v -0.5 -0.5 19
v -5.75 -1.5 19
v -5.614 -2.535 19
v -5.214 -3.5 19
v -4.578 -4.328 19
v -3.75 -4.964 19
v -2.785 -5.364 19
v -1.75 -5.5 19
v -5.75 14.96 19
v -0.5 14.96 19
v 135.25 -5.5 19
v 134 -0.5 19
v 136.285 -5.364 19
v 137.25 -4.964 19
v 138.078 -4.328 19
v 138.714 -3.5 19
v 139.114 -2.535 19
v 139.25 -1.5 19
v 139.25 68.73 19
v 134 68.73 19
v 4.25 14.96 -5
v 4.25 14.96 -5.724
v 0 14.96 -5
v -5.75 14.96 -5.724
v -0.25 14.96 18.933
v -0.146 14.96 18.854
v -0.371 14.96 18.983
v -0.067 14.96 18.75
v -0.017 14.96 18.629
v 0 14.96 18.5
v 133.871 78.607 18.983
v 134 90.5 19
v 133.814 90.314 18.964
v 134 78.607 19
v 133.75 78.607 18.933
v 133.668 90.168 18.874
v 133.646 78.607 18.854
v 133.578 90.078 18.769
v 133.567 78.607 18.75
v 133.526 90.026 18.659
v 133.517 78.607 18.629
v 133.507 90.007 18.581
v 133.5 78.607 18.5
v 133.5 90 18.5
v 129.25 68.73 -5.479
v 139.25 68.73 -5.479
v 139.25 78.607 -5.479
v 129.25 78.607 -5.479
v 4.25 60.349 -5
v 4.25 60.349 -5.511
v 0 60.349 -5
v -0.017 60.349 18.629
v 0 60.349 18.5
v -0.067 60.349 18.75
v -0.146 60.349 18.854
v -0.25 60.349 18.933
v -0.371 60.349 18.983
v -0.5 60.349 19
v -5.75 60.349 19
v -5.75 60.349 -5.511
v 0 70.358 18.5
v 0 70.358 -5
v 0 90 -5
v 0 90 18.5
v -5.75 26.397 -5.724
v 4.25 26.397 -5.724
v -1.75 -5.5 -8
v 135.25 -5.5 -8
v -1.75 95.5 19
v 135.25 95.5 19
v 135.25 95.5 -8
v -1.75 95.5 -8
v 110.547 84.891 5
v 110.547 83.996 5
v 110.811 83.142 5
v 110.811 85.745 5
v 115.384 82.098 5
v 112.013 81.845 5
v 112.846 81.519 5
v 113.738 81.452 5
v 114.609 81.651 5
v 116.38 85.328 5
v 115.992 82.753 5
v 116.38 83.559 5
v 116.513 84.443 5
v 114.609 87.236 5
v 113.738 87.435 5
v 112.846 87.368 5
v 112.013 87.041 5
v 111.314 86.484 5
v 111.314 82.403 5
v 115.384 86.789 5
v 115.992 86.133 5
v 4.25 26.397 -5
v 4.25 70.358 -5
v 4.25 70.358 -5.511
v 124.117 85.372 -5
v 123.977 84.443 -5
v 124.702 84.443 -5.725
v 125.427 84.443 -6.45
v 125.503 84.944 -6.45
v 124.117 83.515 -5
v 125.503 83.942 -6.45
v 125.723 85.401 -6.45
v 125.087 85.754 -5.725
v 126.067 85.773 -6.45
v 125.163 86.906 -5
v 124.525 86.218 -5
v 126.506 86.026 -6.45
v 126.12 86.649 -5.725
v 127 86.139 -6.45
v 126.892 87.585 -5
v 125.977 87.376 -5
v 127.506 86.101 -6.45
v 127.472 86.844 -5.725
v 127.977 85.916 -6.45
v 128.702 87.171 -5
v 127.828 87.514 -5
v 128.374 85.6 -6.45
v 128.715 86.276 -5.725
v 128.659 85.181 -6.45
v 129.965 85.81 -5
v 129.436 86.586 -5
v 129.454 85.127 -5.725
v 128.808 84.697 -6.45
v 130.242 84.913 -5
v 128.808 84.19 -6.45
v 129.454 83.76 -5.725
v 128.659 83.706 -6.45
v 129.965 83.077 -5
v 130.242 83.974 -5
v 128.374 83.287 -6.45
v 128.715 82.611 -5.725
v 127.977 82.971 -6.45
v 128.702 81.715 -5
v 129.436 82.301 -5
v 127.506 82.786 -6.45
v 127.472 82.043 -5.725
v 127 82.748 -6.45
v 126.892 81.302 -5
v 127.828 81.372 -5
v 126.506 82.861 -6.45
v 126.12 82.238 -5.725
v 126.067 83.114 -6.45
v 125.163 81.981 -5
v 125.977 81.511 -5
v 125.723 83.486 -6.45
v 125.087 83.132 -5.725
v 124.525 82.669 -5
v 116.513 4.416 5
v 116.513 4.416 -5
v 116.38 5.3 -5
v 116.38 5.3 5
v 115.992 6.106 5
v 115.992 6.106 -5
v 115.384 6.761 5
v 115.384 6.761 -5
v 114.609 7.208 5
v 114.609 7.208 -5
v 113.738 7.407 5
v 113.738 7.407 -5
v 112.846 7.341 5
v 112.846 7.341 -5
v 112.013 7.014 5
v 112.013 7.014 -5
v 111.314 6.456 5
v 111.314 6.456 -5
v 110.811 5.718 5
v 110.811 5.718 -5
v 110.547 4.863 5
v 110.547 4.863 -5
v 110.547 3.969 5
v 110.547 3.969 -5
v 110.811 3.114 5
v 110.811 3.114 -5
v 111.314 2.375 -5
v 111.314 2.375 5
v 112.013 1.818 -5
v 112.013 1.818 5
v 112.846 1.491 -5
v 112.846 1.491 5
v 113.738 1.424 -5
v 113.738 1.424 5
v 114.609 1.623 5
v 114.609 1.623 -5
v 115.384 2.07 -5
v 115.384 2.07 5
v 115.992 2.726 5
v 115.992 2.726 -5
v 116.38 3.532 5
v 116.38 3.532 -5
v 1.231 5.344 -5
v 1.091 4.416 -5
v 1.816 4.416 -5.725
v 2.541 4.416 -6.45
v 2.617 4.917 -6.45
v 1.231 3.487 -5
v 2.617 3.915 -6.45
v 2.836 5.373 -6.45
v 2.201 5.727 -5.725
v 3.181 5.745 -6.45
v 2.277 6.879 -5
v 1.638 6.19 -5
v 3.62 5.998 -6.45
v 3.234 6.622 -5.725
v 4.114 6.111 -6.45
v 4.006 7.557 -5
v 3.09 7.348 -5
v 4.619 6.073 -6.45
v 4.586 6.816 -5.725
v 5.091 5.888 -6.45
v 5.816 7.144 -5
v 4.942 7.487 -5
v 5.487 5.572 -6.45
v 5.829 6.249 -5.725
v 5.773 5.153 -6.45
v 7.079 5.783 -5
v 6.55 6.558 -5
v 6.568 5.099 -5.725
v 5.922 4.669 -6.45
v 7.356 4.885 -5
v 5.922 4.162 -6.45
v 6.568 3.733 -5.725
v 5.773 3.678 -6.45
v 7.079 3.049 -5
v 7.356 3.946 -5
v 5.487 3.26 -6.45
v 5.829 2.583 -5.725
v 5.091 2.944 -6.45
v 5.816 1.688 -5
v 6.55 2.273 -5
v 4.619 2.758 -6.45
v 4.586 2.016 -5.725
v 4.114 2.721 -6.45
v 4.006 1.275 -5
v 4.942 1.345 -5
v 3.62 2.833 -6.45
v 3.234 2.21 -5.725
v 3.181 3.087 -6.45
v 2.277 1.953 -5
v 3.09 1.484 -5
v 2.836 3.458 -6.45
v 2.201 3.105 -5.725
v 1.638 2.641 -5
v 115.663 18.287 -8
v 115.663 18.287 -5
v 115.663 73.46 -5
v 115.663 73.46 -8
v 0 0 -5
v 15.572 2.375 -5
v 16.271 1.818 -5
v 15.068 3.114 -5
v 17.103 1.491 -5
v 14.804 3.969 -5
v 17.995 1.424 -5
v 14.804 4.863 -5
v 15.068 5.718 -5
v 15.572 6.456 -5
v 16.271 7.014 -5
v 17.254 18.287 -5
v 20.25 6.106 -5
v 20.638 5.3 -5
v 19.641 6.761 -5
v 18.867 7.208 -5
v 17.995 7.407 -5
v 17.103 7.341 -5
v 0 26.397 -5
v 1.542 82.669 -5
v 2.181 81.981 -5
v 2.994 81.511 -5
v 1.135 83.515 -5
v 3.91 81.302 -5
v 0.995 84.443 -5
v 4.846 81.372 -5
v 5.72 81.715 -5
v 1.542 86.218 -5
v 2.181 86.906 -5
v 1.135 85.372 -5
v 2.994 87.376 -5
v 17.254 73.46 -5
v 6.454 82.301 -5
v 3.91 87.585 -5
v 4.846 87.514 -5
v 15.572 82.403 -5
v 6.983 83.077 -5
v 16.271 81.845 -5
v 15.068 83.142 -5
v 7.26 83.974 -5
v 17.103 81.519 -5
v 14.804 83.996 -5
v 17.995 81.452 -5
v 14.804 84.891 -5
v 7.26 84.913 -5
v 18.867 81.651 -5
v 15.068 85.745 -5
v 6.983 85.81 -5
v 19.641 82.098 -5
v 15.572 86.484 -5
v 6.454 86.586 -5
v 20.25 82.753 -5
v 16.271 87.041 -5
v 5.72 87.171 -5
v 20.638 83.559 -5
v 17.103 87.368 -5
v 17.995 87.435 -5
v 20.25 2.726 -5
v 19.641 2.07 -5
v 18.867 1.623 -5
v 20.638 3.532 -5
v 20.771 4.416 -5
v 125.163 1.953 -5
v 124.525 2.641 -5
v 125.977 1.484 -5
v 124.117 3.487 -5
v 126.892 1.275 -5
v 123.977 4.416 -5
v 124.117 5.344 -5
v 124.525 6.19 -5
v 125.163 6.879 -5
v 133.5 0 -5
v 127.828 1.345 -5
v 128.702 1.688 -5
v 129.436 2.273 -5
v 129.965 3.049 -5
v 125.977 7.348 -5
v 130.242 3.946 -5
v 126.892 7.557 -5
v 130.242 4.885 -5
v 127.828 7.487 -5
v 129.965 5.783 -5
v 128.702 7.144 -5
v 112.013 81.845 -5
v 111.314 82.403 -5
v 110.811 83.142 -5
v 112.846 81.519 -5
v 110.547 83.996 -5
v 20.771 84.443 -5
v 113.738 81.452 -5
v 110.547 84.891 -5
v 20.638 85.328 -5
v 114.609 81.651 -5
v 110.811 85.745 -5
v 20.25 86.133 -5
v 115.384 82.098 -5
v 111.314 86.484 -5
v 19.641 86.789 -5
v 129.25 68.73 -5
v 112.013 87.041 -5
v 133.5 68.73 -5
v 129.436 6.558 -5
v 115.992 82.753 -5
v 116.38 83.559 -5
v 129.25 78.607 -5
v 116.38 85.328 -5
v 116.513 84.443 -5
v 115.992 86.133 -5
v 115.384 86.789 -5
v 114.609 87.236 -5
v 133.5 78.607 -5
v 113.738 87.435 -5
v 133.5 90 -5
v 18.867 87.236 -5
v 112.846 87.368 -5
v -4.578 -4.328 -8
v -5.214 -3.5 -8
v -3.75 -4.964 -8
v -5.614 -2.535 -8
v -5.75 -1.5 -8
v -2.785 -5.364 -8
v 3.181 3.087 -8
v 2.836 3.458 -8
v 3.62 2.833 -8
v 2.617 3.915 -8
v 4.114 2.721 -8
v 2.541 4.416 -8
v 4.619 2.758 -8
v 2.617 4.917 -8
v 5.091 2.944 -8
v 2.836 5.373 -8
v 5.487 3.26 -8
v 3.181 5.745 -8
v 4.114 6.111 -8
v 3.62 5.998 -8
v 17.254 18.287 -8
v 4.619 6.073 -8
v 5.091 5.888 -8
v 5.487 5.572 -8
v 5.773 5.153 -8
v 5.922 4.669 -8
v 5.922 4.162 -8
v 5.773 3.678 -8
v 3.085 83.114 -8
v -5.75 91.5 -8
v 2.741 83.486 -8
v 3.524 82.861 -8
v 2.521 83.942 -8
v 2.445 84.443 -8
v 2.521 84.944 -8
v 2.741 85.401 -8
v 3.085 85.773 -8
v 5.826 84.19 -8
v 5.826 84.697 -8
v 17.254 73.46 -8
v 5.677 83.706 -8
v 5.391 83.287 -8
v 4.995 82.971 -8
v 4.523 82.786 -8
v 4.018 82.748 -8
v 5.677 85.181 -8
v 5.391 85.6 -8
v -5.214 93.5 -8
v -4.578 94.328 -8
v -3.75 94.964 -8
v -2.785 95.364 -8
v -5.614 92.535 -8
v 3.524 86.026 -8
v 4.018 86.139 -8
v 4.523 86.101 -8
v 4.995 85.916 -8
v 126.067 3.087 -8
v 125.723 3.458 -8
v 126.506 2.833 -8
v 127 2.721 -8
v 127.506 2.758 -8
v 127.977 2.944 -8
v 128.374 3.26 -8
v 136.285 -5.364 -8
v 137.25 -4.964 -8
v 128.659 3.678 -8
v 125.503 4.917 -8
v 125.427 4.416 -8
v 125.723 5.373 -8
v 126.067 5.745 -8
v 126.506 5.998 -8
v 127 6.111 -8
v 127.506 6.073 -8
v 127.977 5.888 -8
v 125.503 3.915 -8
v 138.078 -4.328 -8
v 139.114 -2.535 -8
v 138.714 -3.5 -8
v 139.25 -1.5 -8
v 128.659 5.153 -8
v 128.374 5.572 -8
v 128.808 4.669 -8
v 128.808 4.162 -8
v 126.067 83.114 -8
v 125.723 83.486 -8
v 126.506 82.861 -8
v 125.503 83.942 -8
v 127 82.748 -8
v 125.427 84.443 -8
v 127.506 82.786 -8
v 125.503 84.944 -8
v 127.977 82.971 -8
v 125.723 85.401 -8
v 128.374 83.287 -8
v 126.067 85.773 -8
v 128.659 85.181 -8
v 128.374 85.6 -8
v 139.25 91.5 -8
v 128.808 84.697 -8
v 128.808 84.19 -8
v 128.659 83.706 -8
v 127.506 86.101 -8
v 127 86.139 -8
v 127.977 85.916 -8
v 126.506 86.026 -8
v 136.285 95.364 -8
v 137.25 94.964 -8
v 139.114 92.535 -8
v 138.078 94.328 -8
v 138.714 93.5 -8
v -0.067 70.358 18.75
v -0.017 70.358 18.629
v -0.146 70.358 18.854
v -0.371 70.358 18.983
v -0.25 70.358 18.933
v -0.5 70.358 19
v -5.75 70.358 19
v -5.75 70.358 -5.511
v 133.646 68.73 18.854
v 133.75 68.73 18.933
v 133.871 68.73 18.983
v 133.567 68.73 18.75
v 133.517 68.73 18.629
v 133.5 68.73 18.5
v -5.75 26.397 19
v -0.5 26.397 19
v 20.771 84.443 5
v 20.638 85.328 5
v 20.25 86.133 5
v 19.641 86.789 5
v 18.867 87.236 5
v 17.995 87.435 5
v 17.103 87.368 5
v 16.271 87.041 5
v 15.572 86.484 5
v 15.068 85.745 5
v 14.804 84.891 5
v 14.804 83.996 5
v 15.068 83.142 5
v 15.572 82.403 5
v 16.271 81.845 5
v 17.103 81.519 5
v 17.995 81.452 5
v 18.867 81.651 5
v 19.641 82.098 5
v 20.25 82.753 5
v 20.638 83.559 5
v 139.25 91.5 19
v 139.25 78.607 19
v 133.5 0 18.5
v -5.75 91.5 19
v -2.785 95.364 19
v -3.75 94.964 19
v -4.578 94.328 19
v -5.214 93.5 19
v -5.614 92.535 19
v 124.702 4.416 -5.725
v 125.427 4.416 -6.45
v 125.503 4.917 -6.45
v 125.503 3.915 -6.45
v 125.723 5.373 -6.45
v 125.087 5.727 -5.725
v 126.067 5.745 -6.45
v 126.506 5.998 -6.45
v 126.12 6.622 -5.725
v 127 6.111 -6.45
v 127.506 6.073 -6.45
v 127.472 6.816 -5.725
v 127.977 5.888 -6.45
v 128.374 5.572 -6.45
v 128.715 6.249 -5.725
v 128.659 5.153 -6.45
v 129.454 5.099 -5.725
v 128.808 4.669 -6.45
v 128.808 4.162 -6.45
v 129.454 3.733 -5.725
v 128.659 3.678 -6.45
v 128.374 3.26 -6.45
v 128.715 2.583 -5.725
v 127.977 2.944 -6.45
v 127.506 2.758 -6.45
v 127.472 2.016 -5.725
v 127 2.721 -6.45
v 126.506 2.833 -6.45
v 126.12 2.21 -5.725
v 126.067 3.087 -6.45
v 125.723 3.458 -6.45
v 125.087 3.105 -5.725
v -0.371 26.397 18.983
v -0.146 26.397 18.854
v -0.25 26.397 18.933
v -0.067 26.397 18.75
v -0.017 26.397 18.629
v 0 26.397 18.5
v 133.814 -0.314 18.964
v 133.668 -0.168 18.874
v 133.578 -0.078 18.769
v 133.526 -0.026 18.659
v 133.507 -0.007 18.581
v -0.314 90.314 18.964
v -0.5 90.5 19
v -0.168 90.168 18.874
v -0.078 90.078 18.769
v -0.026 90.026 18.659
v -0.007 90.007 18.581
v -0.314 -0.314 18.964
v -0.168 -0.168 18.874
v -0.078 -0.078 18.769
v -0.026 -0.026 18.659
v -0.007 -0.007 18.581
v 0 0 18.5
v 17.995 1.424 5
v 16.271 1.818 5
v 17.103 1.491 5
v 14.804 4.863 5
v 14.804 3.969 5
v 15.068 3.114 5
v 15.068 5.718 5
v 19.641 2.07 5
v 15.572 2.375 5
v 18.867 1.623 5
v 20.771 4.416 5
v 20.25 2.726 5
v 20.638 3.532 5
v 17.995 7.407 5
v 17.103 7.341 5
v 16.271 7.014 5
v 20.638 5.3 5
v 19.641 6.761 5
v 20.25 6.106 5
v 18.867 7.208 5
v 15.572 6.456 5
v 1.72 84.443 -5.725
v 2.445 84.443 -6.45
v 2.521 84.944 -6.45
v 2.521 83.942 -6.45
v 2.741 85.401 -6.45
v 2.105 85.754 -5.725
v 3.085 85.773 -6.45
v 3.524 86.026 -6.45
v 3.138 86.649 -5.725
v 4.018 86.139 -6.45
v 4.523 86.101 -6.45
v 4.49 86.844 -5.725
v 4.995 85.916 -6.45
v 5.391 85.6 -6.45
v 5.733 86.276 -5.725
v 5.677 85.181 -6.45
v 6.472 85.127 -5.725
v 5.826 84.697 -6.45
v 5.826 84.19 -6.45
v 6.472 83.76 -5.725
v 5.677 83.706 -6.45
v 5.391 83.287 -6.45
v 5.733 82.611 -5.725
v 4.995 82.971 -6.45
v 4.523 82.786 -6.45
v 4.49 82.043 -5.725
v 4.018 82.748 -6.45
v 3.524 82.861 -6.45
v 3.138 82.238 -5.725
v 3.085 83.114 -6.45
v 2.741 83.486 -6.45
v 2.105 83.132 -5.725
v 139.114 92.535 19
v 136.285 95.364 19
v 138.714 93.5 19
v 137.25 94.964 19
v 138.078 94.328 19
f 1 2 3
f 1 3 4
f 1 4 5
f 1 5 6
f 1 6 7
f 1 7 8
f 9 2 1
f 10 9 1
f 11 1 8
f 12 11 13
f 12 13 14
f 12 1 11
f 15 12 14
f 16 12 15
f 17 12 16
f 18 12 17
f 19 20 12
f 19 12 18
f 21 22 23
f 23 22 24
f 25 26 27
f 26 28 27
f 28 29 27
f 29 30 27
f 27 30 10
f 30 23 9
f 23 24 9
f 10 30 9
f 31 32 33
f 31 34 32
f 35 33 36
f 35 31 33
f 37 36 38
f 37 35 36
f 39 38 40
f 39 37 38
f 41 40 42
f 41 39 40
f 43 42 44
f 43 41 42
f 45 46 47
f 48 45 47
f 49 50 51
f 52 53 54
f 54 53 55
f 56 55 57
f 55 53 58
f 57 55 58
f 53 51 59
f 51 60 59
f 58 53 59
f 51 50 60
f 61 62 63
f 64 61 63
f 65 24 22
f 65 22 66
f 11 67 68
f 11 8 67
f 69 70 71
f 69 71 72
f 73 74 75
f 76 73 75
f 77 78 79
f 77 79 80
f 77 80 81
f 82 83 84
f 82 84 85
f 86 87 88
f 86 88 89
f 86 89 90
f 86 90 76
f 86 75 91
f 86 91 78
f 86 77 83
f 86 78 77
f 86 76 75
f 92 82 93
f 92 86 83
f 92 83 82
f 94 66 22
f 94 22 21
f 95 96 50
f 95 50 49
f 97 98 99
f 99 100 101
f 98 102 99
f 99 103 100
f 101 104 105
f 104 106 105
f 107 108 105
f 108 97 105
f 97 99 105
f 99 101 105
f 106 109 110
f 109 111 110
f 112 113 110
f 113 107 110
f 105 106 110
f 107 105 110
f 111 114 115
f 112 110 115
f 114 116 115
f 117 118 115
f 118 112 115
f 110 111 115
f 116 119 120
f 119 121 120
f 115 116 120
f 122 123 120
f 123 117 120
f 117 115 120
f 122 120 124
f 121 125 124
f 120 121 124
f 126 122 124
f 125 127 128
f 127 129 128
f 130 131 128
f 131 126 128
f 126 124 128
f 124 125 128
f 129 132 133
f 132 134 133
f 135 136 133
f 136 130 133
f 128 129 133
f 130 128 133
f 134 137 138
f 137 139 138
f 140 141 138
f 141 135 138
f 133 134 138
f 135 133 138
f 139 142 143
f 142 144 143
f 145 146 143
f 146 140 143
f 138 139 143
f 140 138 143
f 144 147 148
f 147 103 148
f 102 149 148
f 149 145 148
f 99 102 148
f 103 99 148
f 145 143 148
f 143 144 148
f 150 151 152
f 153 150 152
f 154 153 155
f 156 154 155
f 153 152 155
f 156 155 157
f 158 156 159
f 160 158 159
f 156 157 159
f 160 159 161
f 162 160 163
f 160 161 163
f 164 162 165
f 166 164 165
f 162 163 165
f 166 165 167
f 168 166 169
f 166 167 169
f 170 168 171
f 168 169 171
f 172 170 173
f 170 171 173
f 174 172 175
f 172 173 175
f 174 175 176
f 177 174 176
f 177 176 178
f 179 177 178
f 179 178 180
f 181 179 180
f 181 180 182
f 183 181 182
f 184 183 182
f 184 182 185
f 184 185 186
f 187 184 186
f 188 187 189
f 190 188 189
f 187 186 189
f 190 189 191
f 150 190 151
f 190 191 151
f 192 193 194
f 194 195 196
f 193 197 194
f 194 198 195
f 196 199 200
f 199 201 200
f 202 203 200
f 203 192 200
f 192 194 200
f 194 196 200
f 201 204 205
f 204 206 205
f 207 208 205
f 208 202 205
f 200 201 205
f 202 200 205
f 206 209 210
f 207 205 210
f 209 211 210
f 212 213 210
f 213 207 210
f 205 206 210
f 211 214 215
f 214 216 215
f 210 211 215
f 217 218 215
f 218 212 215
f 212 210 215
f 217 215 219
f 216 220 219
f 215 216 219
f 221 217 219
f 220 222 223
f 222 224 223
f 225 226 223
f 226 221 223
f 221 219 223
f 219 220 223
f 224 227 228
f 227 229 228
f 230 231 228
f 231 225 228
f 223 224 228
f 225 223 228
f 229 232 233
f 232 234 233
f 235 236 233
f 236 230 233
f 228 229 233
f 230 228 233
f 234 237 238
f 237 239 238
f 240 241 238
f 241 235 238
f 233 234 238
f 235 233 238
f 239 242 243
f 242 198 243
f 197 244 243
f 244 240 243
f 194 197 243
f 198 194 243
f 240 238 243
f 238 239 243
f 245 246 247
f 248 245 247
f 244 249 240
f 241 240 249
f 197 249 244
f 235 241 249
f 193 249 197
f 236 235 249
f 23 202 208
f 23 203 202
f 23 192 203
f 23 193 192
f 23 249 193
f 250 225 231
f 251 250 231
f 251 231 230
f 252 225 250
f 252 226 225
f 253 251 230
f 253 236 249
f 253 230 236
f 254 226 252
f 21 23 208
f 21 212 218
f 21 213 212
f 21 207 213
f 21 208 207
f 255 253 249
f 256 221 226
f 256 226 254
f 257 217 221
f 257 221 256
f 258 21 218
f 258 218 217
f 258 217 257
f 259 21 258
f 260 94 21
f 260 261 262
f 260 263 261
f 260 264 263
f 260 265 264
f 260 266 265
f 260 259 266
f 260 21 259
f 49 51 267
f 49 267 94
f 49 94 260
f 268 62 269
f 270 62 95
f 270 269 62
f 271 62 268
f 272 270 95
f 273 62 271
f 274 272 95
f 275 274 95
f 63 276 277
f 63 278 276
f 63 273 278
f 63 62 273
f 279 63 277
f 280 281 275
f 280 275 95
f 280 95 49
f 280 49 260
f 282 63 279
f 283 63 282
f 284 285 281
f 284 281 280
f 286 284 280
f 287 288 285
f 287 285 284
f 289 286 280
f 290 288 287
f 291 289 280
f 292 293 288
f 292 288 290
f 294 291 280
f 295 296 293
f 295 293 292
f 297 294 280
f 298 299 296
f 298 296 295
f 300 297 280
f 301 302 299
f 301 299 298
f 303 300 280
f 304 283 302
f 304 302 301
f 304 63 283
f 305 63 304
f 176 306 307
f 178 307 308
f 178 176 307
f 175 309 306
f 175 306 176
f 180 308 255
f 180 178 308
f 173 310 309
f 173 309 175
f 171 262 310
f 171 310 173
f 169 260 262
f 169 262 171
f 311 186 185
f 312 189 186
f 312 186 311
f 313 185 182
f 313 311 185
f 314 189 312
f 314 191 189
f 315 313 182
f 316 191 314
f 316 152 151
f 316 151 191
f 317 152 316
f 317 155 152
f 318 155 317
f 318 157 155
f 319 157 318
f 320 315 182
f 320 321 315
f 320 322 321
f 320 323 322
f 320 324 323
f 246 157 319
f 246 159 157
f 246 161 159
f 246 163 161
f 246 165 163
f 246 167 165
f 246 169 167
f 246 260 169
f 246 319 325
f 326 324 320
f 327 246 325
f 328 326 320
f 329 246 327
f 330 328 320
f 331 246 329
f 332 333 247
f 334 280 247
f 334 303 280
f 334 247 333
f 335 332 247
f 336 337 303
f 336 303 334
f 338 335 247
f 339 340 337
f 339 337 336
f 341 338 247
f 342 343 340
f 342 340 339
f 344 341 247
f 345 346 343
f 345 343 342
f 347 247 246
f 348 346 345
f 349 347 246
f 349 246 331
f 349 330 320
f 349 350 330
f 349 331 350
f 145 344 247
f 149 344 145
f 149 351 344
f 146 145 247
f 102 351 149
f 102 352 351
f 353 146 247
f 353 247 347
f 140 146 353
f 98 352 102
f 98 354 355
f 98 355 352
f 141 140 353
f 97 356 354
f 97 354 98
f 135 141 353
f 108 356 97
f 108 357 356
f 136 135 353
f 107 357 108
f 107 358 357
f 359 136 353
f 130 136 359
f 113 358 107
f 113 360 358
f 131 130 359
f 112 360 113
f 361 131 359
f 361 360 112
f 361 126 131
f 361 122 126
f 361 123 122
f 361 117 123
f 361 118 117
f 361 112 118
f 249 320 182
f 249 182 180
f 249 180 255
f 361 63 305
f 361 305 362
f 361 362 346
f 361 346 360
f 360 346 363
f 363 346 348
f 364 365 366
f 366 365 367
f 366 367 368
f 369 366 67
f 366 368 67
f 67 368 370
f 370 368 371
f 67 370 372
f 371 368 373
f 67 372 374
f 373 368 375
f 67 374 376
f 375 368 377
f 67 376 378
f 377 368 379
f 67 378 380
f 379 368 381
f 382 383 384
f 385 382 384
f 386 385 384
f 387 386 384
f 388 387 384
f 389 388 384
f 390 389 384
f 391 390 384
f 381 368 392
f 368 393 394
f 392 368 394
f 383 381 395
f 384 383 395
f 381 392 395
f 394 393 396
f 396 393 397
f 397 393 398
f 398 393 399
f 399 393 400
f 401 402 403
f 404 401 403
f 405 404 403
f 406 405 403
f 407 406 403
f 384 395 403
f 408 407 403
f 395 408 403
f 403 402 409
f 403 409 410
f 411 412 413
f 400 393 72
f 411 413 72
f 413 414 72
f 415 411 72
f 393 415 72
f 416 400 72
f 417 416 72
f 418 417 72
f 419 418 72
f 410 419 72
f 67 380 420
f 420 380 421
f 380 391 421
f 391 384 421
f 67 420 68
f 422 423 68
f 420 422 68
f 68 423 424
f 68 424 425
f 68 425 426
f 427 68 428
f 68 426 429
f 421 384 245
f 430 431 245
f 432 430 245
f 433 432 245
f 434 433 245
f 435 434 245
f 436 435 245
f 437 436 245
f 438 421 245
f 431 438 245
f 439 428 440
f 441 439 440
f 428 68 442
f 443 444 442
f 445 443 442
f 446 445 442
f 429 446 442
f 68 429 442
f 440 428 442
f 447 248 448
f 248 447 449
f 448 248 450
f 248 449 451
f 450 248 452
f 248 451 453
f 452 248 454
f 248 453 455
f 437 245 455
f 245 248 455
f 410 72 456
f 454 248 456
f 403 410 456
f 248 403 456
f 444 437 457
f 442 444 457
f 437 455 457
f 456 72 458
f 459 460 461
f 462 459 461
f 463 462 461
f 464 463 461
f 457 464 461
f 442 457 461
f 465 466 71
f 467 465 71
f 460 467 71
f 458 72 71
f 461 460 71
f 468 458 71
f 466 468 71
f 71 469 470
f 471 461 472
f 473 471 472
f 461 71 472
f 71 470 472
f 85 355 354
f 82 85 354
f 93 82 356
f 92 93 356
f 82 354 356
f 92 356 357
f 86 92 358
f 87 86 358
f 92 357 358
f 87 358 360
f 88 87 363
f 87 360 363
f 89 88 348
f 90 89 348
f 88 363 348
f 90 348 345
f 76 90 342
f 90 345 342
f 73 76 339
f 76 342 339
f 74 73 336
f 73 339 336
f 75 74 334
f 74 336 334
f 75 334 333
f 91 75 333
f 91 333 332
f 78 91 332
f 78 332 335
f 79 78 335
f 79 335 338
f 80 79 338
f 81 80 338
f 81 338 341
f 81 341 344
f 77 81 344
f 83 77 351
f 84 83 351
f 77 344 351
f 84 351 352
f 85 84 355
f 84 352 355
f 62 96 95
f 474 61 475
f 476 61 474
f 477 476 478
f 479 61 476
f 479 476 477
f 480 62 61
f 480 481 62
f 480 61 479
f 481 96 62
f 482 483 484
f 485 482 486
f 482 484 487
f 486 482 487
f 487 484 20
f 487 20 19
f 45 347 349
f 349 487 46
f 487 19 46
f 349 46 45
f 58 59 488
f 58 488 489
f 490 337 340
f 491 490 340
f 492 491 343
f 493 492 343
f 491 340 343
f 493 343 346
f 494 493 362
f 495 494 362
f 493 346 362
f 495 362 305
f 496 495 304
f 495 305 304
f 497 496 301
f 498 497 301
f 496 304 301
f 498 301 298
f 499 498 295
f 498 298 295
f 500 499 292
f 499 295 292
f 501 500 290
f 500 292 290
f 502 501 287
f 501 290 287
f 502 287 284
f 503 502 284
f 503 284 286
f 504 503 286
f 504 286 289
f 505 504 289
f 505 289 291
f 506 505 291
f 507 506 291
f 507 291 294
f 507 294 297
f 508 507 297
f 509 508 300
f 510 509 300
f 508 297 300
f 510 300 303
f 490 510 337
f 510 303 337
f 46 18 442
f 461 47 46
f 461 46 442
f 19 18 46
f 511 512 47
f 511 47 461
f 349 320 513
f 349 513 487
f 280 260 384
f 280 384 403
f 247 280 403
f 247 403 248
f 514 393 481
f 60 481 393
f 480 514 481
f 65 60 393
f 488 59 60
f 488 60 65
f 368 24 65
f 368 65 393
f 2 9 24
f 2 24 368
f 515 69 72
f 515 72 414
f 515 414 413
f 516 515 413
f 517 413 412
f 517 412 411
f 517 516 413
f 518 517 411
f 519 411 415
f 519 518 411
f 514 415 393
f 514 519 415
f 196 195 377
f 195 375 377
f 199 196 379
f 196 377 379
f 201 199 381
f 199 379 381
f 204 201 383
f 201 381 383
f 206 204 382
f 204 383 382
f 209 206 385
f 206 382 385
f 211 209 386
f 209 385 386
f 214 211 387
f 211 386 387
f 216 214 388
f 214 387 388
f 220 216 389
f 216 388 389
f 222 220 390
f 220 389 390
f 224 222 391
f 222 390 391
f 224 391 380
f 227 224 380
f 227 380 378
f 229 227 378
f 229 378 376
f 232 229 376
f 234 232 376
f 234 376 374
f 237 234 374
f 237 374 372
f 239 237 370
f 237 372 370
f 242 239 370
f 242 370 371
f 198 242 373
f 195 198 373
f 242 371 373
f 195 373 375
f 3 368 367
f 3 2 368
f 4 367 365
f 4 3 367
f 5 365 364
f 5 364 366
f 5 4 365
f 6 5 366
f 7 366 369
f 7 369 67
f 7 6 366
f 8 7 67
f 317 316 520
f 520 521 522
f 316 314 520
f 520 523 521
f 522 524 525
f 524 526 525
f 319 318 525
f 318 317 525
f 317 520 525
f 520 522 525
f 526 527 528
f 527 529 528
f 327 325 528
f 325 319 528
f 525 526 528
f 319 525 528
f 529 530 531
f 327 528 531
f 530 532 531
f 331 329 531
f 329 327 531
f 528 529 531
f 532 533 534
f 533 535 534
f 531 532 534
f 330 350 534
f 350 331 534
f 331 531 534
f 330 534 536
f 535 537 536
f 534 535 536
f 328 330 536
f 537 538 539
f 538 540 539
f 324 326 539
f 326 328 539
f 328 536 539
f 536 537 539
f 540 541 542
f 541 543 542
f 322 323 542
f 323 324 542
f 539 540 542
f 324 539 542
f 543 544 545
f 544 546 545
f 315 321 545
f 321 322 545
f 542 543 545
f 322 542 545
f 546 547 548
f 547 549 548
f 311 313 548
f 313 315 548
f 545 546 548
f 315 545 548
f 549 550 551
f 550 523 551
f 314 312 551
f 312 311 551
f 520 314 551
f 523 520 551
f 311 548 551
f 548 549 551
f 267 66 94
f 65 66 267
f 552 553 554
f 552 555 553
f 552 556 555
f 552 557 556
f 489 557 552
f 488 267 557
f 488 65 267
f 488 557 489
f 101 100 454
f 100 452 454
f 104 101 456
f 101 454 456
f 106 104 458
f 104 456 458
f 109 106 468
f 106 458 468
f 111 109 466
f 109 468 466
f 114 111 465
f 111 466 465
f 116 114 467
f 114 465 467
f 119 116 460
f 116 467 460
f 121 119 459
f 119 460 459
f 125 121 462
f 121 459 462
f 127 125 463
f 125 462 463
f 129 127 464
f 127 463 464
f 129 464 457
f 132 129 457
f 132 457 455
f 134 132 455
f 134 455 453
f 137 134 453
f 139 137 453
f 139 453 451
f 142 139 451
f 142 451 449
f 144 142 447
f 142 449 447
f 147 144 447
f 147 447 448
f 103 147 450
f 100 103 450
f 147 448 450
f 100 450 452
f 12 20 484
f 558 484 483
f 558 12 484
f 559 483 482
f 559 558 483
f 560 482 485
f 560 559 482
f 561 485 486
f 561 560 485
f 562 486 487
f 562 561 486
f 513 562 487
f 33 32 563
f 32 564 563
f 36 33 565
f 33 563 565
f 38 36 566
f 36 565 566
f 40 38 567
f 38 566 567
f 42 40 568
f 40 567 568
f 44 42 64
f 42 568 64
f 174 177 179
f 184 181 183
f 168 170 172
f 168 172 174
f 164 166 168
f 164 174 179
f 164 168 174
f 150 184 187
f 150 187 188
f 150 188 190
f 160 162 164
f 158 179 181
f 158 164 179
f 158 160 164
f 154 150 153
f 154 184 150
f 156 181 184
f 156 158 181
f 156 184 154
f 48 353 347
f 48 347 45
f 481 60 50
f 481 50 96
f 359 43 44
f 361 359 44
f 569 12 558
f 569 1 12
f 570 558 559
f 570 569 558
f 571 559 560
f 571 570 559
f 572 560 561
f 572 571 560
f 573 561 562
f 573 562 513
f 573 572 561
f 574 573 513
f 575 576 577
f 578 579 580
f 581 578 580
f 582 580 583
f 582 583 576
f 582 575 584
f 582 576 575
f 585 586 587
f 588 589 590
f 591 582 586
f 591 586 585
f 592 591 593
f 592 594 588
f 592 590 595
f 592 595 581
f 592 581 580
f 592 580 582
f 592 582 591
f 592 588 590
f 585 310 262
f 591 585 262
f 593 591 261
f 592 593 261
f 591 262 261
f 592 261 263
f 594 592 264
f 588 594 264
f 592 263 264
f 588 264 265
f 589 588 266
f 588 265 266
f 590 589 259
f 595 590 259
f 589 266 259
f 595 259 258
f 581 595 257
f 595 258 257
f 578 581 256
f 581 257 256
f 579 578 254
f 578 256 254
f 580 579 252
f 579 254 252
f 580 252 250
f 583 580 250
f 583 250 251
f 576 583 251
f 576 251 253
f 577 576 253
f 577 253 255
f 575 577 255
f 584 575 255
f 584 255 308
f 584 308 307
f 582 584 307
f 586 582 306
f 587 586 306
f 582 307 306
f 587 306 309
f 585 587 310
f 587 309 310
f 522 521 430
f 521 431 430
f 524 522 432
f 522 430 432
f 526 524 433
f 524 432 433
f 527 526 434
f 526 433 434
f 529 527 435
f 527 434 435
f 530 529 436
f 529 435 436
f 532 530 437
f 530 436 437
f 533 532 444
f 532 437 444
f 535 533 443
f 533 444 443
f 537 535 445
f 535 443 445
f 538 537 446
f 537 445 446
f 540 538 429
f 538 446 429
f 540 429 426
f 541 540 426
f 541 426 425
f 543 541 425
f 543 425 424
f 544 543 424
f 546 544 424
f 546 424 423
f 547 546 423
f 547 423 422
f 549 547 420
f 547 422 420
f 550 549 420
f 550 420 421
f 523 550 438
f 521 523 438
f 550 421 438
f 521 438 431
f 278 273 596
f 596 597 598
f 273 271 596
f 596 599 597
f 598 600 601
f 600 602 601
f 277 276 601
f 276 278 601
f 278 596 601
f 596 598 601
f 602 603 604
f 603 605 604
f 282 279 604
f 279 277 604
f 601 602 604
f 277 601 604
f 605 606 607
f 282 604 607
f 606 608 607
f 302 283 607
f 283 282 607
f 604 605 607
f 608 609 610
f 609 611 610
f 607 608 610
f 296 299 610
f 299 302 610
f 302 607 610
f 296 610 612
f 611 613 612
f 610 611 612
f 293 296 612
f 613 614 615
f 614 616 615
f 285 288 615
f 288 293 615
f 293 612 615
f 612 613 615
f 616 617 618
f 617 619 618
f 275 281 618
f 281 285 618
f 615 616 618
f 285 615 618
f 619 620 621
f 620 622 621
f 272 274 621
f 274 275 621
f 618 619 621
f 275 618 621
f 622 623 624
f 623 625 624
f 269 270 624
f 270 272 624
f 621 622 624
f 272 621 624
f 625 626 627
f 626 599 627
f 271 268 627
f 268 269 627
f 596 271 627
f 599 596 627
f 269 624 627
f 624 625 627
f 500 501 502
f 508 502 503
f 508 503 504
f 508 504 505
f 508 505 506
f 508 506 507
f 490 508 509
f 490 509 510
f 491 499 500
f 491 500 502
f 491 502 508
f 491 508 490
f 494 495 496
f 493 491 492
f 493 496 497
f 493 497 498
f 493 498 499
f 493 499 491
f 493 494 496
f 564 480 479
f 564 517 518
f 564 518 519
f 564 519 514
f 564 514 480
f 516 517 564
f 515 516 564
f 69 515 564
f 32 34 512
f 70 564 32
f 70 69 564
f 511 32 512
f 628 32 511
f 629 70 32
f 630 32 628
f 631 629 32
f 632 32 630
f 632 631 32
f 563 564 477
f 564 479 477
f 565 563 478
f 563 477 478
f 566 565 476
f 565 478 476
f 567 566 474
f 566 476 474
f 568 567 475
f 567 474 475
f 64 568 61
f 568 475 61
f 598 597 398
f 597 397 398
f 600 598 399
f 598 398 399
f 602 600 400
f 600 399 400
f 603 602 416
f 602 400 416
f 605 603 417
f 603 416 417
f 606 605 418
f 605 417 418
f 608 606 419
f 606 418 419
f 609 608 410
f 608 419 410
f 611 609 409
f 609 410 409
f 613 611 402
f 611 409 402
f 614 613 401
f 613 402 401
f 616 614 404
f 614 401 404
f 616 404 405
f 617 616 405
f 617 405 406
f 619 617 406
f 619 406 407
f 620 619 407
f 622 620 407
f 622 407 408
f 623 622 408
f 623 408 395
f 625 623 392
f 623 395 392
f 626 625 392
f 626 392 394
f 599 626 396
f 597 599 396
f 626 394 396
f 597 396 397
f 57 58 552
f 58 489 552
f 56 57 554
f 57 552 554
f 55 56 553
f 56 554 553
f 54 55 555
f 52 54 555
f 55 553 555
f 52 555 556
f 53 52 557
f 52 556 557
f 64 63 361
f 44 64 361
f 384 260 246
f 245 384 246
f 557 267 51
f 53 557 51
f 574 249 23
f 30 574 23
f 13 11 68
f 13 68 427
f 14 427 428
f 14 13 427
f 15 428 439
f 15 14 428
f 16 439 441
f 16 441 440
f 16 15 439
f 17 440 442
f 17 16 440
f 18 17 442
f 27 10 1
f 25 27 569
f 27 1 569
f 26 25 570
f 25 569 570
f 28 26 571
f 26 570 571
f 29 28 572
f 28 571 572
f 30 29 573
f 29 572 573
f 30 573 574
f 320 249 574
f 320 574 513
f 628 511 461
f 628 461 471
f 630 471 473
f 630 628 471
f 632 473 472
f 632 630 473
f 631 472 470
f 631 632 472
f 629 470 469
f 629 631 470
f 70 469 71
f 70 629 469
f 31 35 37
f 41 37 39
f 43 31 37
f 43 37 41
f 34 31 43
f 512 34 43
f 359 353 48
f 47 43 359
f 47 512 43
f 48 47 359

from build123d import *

# Parameters (mm, degrees)
BOSS_EXTRU_1_DEPTH                             = 19
BOSS_EXTRU_1_DEPTH_BACK                        = 8
ESQUISSE1_W                                    = 133.5
ESQUISSE1_H                                    = 90
ENL_V_MAT_EXTRU_1_DEPTH                        = 47
ENL_V_MAT_EXTRU_1_DEPTH_BACK                   = 5
FRAISAGE_POUR_VIS_T_TE_FRAIS_E_M32_D           = 3.4
FRAISAGE_POUR_VIS_T_TE_FRAIS_E_M32_DEPTH       = 5
FRAISAGE_POUR_VIS_T_TE_FRAIS_E_M32_CSINK_D     = 6.3
FRAISAGE_POUR_VIS_T_TE_FRAIS_E_M32_CSINK_ANGLE = 90
FRAISAGE_POUR_VIS_T_TE_FRAIS_E_M32_TIP         = 1.021463052
ESQUISSE7_W                                    = 24.511286956
ESQUISSE7_H                                    = 10.008551301
ENL_V_MAT_EXTRU_2_DEPTH                        = 10
ESQUISSE8_W                                    = 24.723742657
ESQUISSE8_H                                    = 11.436875975
ENL_V_MAT_EXTRU_3_DEPTH                        = 10
ESQUISSE9_W                                    = 24.478686325
ESQUISSE9_H                                    = 9.877285249
ENL_V_MAT_EXTRU_4_DEPTH                        = 10
CONG_1_R                                       = 0.5
ESQUISSE10_R                                   = 3
BOSS_EXTRU_2_DEPTH                             = 10
ESQUISSE12_W                                   = 98.408714422
ESQUISSE12_H                                   = 55.172933086
ENL_V_MAT_EXTRU_5_DEPTH                        = 10


with BuildPart() as part:
    # EsquisseExterieur → Boss.-Extru.1 (new body, two sides)
    with BuildSketch(Plane.XY) as boss_extru_1_sk:
        with BuildLine():
            Line((-1.75, -5.5), (135.25, -5.5))
            ThreePointArc((135.25, -5.5), (138.078427125, -4.328427125), (139.25, -1.5))
            Line((139.25, -1.5), (139.25, 91.5))
            ThreePointArc((139.25, 91.5), (138.078427125, 94.328427125), (135.25, 95.5))
            Line((135.25, 95.5), (-1.75, 95.5))
            ThreePointArc((-1.75, 95.5), (-4.578427125, 94.328427125), (-5.75, 91.5))
            Line((-5.75, 91.5), (-5.75, -1.5))
            ThreePointArc((-5.75, -1.5), (-4.578427125, -4.328427125), (-1.75, -5.5))
        make_face()
    extrude(amount=BOSS_EXTRU_1_DEPTH)
    extrude(boss_extru_1_sk.sketch, amount=-BOSS_EXTRU_1_DEPTH_BACK)

    # Esquisse1 → Enlèv. mat.-Extru.1 (cut, two sides)
    with BuildSketch(Plane.XY) as enl_v_mat_extru_1_sk:
        with Locations((66.75, 45)):
            Rectangle(ESQUISSE1_W, ESQUISSE1_H)
    extrude(amount=ENL_V_MAT_EXTRU_1_DEPTH, mode=Mode.SUBTRACT)
    extrude(enl_v_mat_extru_1_sk.sketch, amount=-ENL_V_MAT_EXTRU_1_DEPTH_BACK, mode=Mode.SUBTRACT)

    # Fraisage pour vis à tête fraisée M32
    with Locations(Plane.XY.offset(-5)):
        with Locations((4.145138972, 84.443401206), (127.127377422, 84.443401206), (127.127377422, 4.415852319), (4.240996888, 4.415852319)):
            CounterSinkHole(FRAISAGE_POUR_VIS_T_TE_FRAIS_E_M32_D / 2, FRAISAGE_POUR_VIS_T_TE_FRAIS_E_M32_CSINK_D / 2, depth=FRAISAGE_POUR_VIS_T_TE_FRAIS_E_M32_DEPTH, counter_sink_angle=FRAISAGE_POUR_VIS_T_TE_FRAIS_E_M32_CSINK_ANGLE)
            with Locations((0, 0, -(FRAISAGE_POUR_VIS_T_TE_FRAIS_E_M32_DEPTH + FRAISAGE_POUR_VIS_T_TE_FRAIS_E_M32_TIP / 2))):  # 118° drill point
                Cone(0, FRAISAGE_POUR_VIS_T_TE_FRAIS_E_M32_D / 2, FRAISAGE_POUR_VIS_T_TE_FRAIS_E_M32_TIP, mode=Mode.SUBTRACT)

    # Esquisse7 → Enlèv. mat.-Extru.2 (cut)
    with BuildSketch(Plane.ZY.offset(5.75)):
        with Locations((6.744356522, 65.353288209)):
            Rectangle(ESQUISSE7_W, ESQUISSE7_H)
    extrude(amount=-ENL_V_MAT_EXTRU_2_DEPTH, mode=Mode.SUBTRACT)

    # Esquisse8 → Enlèv. mat.-Extru.3 (cut)
    with BuildSketch(Plane.ZY.offset(5.75)):
        with Locations((6.638128671, 20.678831333)):
            Rectangle(ESQUISSE8_W, ESQUISSE8_H)
    extrude(amount=-ENL_V_MAT_EXTRU_3_DEPTH, mode=Mode.SUBTRACT)

    # Esquisse9 → Enlèv. mat.-Extru.4 (cut)
    with BuildSketch(Plane(origin=(139.25, 0, 0), x_dir=(0, 0, -1), z_dir=(1, 0, 0))):
        with Locations((-6.760656838, 73.668720261)):
            Rectangle(ESQUISSE9_W, ESQUISSE9_H)
    extrude(amount=-ENL_V_MAT_EXTRU_4_DEPTH, mode=Mode.SUBTRACT)

    # Congé1
    cong_1_edges = [part.edges().sort_by_distance(p)[0] for p in [
        (0, 7.480196672, 19),
        (133.5, 84.303681443, 19),
        (66.75, 90, 19),
        (133.5, 34.365038818, 19),
        (66.75, 0, 19),
        (0, 80.17878193, 19),
        (0, 43.373140939, 19),
    ]]
    fillet(cong_1_edges, radius=CONG_1_R)

    # Esquisse10 → Boss.-Extru.2 (add)
    with BuildSketch(Plane.XY.offset(-5)):
        with Locations((17.770805857, 84.443401206)):
            Circle(ESQUISSE10_R)
        with Locations((113.513450355, 84.443401206)):
            Circle(ESQUISSE10_R)
        with Locations((17.770805857, 4.415852319)):
            Circle(ESQUISSE10_R)
        with Locations((113.513450355, 4.415852319)):
            Circle(ESQUISSE10_R)
    extrude(amount=BOSS_EXTRU_2_DEPTH)

    # Esquisse12 → Enlèv. mat.-Extru.5 (cut)
    with BuildSketch(Plane.XY.offset(-5)):
        with Locations((66.458849957, 45.873450128)):
            Rectangle(ESQUISSE12_W, ESQUISSE12_H)
    extrude(amount=-ENL_V_MAT_EXTRU_5_DEPTH, mode=Mode.SUBTRACT)


solid = part.part
